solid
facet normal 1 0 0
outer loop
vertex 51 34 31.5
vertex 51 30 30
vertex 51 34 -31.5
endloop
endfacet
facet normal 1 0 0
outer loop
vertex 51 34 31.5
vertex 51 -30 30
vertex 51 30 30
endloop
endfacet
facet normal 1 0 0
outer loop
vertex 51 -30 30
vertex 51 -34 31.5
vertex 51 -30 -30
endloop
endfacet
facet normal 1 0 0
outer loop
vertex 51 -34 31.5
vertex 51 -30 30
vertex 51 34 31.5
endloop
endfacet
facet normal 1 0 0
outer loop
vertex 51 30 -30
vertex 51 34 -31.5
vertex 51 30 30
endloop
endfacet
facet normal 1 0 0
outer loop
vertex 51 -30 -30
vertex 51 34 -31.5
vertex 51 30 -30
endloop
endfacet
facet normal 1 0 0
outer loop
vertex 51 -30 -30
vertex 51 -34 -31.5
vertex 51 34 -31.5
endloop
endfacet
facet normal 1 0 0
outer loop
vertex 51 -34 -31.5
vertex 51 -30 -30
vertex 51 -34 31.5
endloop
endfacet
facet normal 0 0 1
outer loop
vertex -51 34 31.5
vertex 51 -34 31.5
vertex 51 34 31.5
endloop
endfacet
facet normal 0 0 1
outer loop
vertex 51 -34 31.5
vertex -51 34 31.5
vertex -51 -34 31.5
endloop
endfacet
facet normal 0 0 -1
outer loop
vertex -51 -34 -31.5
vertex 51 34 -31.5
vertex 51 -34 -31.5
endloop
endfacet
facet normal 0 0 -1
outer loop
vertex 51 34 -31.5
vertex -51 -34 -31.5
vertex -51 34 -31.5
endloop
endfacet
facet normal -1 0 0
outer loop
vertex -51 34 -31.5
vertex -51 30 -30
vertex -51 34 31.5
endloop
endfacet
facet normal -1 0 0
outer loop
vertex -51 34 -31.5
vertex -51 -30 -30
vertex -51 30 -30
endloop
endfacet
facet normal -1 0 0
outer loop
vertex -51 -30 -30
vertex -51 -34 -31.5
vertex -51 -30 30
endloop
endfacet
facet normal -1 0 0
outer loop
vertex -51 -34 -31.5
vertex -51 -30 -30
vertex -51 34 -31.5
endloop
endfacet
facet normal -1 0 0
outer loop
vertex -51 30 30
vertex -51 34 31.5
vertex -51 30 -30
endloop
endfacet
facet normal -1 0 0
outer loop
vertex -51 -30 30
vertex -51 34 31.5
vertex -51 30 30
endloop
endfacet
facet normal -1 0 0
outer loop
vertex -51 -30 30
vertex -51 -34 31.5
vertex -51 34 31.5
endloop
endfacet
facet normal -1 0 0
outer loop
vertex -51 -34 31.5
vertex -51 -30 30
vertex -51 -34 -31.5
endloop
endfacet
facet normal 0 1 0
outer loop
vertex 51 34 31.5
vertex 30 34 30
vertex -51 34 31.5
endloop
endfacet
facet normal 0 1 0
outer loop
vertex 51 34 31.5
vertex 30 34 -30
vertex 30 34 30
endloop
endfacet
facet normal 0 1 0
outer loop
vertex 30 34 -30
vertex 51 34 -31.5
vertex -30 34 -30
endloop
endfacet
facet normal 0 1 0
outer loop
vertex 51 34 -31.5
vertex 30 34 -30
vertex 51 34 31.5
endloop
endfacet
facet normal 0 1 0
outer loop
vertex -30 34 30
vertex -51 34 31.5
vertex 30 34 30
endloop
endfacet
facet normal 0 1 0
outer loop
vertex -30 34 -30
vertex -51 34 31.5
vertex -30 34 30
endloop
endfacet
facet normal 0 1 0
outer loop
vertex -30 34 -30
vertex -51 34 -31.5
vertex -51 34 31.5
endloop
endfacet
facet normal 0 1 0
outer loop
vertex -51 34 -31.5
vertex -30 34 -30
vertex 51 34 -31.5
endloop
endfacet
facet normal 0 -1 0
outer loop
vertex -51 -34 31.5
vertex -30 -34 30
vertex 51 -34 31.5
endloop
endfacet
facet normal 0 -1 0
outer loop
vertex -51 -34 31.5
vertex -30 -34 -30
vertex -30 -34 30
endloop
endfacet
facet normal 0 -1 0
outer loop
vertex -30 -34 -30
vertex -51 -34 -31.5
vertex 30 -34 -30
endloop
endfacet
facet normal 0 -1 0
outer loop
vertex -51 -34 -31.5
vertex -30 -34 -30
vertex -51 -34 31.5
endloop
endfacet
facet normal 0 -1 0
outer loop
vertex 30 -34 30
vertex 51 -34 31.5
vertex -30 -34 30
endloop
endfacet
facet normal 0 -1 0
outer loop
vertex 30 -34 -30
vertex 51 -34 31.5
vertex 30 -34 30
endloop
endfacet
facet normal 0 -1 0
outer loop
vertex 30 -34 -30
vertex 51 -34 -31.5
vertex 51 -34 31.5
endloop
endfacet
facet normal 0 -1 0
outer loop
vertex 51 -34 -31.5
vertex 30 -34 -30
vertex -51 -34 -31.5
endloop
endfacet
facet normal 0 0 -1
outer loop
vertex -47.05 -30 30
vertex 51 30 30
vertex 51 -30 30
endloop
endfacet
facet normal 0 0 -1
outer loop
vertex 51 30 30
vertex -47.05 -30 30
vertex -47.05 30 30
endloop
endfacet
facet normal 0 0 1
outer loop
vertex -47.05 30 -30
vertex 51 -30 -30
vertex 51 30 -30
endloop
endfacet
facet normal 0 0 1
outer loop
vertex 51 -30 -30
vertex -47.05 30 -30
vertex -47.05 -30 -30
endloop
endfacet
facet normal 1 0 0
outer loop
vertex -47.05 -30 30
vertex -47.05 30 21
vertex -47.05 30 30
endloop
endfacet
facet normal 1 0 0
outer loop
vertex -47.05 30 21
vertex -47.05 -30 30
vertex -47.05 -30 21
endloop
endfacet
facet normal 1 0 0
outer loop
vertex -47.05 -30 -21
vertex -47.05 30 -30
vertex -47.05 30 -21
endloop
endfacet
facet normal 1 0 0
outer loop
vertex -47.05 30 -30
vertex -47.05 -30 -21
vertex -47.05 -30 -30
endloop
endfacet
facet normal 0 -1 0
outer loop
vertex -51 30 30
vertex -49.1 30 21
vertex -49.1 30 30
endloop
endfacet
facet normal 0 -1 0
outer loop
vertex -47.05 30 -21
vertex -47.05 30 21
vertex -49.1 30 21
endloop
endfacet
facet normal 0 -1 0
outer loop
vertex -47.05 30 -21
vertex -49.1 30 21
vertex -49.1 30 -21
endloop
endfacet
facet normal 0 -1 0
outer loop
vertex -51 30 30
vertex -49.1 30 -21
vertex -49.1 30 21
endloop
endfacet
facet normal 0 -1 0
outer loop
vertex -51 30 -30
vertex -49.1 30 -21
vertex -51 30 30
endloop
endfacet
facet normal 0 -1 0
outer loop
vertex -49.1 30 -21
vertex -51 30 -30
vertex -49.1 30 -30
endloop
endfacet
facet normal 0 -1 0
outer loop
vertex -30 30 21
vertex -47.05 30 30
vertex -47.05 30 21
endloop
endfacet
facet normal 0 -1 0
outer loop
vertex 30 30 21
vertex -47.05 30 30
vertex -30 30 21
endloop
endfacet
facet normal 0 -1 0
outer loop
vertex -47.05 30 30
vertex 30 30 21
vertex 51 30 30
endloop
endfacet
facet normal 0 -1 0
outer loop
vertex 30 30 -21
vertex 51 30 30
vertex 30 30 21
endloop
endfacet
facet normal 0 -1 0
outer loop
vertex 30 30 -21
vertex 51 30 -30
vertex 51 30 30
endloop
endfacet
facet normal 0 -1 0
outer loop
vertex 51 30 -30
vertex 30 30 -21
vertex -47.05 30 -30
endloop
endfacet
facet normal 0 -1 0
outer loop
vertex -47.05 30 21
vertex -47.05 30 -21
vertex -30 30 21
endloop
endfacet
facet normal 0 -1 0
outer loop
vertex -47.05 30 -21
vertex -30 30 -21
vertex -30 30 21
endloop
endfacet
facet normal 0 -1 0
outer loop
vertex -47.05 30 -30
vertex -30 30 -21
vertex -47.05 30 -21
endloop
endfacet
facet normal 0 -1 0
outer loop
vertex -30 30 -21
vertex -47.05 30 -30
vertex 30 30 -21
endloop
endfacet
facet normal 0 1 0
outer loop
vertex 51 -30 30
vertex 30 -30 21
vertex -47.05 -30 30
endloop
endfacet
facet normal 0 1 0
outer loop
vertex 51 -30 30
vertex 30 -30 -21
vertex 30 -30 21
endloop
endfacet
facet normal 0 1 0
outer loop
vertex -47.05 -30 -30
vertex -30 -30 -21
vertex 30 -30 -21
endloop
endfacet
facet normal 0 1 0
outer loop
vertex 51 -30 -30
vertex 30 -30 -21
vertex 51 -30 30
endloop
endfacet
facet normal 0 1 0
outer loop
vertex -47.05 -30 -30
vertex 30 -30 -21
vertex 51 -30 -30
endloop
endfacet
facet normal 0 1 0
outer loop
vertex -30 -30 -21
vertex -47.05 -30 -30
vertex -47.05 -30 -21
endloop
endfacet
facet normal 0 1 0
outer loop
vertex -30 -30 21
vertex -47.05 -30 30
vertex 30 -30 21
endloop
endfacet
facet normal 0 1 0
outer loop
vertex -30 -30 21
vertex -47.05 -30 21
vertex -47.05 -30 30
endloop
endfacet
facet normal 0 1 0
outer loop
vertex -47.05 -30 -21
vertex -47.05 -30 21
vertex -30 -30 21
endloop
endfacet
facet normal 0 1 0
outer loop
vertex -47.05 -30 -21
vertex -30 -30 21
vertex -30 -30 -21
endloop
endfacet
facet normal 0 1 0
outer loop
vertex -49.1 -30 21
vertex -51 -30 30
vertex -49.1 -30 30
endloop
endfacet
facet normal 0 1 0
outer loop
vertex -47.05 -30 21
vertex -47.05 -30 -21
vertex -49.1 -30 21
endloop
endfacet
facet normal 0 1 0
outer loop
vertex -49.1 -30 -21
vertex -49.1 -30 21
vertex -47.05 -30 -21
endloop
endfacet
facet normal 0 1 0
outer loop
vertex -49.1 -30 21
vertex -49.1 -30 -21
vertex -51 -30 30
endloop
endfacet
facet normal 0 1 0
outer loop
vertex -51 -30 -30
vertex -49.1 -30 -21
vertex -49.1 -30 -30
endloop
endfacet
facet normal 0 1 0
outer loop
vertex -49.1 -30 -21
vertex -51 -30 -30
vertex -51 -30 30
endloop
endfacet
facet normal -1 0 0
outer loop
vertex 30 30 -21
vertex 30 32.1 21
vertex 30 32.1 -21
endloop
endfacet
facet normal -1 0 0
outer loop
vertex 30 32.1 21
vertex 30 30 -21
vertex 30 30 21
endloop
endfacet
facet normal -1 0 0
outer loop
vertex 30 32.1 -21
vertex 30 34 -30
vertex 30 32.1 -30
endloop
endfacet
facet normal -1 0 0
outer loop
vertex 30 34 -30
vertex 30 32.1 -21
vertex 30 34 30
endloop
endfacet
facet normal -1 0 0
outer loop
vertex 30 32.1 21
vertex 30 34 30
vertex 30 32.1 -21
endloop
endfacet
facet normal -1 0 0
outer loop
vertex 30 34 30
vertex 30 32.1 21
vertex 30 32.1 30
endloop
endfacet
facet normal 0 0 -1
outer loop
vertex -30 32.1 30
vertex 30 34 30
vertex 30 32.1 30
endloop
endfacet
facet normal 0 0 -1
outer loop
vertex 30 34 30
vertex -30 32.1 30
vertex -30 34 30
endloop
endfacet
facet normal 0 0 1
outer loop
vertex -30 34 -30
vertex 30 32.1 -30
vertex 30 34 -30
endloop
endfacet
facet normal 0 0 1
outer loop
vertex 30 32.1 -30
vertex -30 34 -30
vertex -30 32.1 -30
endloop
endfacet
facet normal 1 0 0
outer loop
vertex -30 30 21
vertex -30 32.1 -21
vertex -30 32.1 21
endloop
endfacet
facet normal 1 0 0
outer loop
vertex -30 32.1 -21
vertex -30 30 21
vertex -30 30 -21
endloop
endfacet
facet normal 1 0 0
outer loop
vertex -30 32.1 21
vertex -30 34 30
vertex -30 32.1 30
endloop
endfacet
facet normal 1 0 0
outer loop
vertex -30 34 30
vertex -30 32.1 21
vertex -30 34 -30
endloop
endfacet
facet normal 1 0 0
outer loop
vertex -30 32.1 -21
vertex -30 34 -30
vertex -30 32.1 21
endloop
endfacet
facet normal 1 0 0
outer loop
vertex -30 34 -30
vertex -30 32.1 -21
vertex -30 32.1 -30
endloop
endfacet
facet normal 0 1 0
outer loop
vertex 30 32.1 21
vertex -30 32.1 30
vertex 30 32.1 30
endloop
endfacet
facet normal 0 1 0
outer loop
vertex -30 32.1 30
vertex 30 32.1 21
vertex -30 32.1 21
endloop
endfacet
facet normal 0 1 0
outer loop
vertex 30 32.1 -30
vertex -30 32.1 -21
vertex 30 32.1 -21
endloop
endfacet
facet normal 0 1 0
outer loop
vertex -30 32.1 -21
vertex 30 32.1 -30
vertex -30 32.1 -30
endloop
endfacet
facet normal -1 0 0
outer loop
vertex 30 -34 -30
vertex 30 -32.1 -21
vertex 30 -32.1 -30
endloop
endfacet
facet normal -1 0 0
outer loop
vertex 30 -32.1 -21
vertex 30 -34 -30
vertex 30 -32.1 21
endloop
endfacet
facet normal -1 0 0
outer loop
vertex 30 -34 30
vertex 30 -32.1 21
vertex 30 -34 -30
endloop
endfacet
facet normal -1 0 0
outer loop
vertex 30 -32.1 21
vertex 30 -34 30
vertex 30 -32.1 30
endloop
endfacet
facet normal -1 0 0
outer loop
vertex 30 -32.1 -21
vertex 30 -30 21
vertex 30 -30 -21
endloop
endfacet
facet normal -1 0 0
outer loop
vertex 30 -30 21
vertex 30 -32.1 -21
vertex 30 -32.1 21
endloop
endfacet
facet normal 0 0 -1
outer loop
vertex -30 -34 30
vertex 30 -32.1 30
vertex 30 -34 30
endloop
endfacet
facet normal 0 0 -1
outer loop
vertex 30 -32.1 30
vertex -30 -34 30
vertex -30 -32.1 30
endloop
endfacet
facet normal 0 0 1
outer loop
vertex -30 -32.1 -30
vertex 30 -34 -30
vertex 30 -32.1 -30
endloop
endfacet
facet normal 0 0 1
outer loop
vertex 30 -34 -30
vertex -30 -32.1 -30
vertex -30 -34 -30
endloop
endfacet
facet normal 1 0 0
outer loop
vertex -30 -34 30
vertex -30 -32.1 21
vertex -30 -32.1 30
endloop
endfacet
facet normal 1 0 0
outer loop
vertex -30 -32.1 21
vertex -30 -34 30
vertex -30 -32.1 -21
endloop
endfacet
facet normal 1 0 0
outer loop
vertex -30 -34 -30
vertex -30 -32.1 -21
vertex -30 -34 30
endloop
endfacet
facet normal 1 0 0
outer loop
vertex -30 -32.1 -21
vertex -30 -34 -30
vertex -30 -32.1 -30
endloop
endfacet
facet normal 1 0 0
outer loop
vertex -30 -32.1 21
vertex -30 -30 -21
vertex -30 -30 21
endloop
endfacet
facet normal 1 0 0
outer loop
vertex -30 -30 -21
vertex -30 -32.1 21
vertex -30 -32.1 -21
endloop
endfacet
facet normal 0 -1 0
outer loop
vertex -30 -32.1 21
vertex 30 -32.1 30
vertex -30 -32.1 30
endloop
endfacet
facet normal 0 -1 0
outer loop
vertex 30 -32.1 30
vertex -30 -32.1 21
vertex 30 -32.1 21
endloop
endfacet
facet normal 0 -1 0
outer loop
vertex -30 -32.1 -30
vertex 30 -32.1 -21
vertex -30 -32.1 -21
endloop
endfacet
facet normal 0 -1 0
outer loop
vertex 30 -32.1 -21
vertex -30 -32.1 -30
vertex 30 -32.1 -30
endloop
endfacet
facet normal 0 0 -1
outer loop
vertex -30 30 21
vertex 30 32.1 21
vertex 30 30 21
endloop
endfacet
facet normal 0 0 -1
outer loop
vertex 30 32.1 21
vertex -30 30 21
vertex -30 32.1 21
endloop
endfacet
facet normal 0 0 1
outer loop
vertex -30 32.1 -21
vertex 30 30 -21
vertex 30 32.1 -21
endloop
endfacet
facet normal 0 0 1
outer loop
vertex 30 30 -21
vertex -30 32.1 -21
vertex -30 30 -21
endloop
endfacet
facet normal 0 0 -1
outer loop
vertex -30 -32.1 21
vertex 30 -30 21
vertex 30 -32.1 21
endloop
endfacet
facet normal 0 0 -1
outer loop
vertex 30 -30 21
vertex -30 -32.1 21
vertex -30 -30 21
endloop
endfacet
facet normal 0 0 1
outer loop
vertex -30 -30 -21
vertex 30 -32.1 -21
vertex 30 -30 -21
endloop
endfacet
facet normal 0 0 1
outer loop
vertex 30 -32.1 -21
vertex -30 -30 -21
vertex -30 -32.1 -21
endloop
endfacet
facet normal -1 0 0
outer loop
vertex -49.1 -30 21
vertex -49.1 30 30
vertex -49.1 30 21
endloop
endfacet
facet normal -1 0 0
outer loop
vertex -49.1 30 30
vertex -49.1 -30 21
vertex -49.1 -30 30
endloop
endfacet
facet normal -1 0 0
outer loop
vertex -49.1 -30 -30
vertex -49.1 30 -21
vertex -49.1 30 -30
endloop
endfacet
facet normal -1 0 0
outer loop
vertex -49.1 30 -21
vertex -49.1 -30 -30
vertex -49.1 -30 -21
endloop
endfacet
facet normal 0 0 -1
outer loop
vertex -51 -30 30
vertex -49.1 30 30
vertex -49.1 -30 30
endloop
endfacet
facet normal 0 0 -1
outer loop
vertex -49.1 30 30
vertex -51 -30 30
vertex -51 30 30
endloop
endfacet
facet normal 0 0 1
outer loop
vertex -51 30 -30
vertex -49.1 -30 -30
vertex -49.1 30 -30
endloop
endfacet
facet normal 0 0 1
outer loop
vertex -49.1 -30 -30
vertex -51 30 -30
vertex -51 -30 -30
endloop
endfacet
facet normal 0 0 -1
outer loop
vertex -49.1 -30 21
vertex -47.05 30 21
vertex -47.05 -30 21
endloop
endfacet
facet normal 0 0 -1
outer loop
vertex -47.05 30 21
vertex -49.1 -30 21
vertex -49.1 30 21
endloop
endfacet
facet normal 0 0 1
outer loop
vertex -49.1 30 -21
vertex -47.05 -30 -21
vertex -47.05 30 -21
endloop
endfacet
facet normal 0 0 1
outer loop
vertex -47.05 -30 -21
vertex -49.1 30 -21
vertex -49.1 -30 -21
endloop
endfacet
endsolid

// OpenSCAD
/*inner hull of a 3 way electrical outlet-*/
difference(){
cube([102,68,63],center=true);
translate([4,0,0]) cube([102.1,60,60],center=true);
translate([-30,32.1,-30])cube([60,2,60]);
translate([-30,-34.1,-30])cube([60,2,60]);
translate([-30,29.7,-21])cube([60,3,42]);
translate([-30,-32.9,-21])cube([60,3,42]);
translate([-51.1,-30,-30])cube([2,60,60]);
translate([-49.15,-30,-21])cube([3,60,42]);
}



/*end comment*/
